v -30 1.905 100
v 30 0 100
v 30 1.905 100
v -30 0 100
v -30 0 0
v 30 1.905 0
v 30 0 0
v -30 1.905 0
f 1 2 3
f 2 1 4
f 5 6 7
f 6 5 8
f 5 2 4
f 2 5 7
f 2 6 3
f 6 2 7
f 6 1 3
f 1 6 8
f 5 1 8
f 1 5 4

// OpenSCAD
module shelfplaywood(width=60, height = 100, playwood_thickness = 0.75 * 2.54) 
{
    translate([0,playwood_thickness/2,height/2])
        
    color([214/255, 162/255, 29/255, 0.5])
    cube([width, playwood_thickness, height],center=true);
}

shelfplaywood();
